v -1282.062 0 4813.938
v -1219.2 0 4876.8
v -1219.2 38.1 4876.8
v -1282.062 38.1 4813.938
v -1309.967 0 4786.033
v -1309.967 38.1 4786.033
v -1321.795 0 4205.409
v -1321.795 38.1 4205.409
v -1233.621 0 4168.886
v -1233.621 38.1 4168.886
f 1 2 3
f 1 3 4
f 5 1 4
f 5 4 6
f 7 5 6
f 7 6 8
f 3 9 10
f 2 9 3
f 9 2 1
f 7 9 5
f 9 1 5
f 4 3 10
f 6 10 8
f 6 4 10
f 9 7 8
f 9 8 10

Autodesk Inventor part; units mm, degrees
ref_plane "YZ Plane" through (0, 0, 0) normal (1, 0, 0) x (0, 1, 0)
ref_plane "XZ Plane" through (0, 0, 0) normal (0, 1, 0) x (-1, 0, 0)
ref_plane "XY Plane" through (0, 0, 0) normal (0, 0, 1) x (1, 0, 0)
sketch "Sketch1" plane through (0, 0, 0) normal (0, 1, 0) x (-1, 0, 0)
  line L0 (0, 0) -> (0, -1219.2)
  line L1 (0, 0) -> (88.9, 0)
  line L2 (88.9, 0) -> (88.9, -1219.2)
  line L3 (88.9, -1219.2) -> (0, -1219.2)
  line L4 (0, 0) -> (0, 1219.2) construction
  line L5 (0, 1219.2) -> (1219.2, 1219.2) construction
  line L6 (0, 1219.2) -> (0, 3657.6) construction
  line L7 (0, 3657.6) -> (0, 4876.8) construction
  line L8 (0, 4876.8) -> (0, 6096) construction
  line L9 (0, -1219.2) -> (2438.4, -1219.2) construction
  line L10 (0, 6096) -> (2438.4, 6096) construction
  line L11 (2438.4, 6096) -> (2438.4, -1219.2) construction
  line L12 (0, 3657.6) -> (0, 3352.8) construction
  line L13 (0, 3352.8) -> (2438.4, 3352.8) construction
  line L14 (2438.4, 3352.8) -> (1219.2, 3352.8)
  line L15 (1219.2, 3352.8) -> (1219.2, 3263.9)
  line L16 (1219.2, 3263.9) -> (2438.4, 3263.9)
  line L17 (2438.4, 3263.9) -> (2438.4, 3352.8)
  line L18 (0, 6096) -> (862.1046, 6958.1046)
  line L19 (862.1046, 6958.1046) -> (924.9664, 6895.2428)
  line L20 (924.9664, 6895.2428) -> (62.8618, 6033.1382)
  line L21 (62.8618, 6033.1382) -> (0, 6096)
  line L22 (0, 4876.8) -> (1219.2, 4876.8) construction
  line L23 (1219.2, 4876.8) -> (2081.3046, 5738.9046)
  line L24 (1219.2, 1219.2) -> (2081.3046, 357.0954)
  line L25 (2081.3046, 357.0954) -> (2018.4428, 294.2336)
  line L26 (2018.4428, 294.2336) -> (1156.3382, 1156.3382)
  line L27 (1156.3382, 1156.3382) -> (1219.2, 1219.2)
  line L28 (2018.4428, 294.2336) -> (88.9, -1219.2)
  line L29 (2081.3046, 357.0954) -> (2144.1664, 419.9572)
  line L30 (2144.1664, 419.9572) -> (1282.0618, 1282.0618)
  line L31 (1282.0618, 1282.0618) -> (1219.2, 1219.2)
  line L32 (2438.4, 3352.8) -> (2438.4, 3441.7)
  line L33 (2438.4, 3441.7) -> (1219.2, 3441.7)
  line L34 (1219.2, 3441.7) -> (1219.2, 3352.8)
  line L35 (1156.3382, 4939.6618) -> (1282.0618, 4813.9382)
  line L36 (2018.4428, 5801.7664) -> (2144.1664, 5676.0428)
  line L37 (1282.0618, 4813.9382) -> (2144.1664, 5676.0428)
  line L38 (2018.4428, 5801.7664) -> (1156.3382, 4939.6618)
  line L39 (2018.4428, 5801.7664) -> (924.9664, 6895.2428)
  line L40 (62.8618, 6033.1382) -> (1156.3382, 4939.6618)
  line L41 (1233.6206, 4168.8855) -> (1267.6412, 4086.7527)
  line L42 (1263.7078, 2313.9849) -> (1230.0006, 2231.7229)
  arc A0 (862.1046, 6958.1046) -> (0, 6096) centre (431.0523, 6527.0523) ccw
  line L43 (1246.8542, 2272.8539) -> (2375.0183, 1810.583)
  line L44 (2391.8719, 1851.7139) -> (2358.1646, 1769.452)
  line L45 (2391.8719, 1851.7139) -> (1263.7078, 2313.9849)
  line L46 (1230.0006, 2231.7229) -> (2358.1646, 1769.452)
  line L47 (1230.0006, 2231.7229) -> (1219.2, 3263.9)
  line L48 (2144.1664, 419.9572) -> (2391.8719, 1851.7139)
  line L49 (2391.8719, 1851.7139) -> (2438.4, 3263.9)
  line L50 (1219.2, 3441.7) -> (1233.6206, 4168.8855)
  line L51 (1250.6309, 4127.8191) -> (2377.0248, 4594.3867)
  line L52 (2360.0145, 4635.4532) -> (2394.0351, 4553.3203)
  line L53 (2394.0351, 4553.3203) -> (1267.6412, 4086.7527)
  line L54 (2360.0145, 4635.4532) -> (1233.6206, 4168.8855)
  line L55 (2394.0351, 4553.3203) -> (2144.1664, 5676.0428)
  line L56 (2438.4, 3441.7) -> (2394.0351, 4553.3203)
  line L57 (2144.1664, 5676.0428) -> (2057.3895, 5656.7301)
  line L58 (2394.0351, 4553.3203) -> (2305.2058, 4549.7751)
  line L59 (2394.0351, 4553.3203) -> (2307.2582, 4534.0076)
  line L60 (2307.2582, 4534.0076) -> (2057.3895, 5656.7301)
  line L61 (2438.4, 3441.7) -> (2349.5707, 3438.1548)
  line L62 (2349.5707, 3438.1548) -> (2305.2058, 4549.7751)
  line L63 (1219.2, 3441.7) -> (1308.0825, 3439.9374)
  line L64 (1233.6206, 4168.8855) -> (1322.5031, 4167.1229)
  line L65 (1322.5031, 4167.1229) -> (1308.0825, 3439.9374)
  line L66 (2018.4428, 5801.7664) -> (1955.581, 5738.9046)
  line L67 (1955.581, 5738.9046) -> (862.1046, 6832.381)
  line L68 (924.9664, 6895.2428) -> (862.1046, 6832.381)
  line L69 (62.8618, 6033.1382) -> (125.7236, 6096)
  line L70 (62.8618, 6033.1382) -> (125.7236, 6096)
  line L71 (125.7236, 6096) -> (1219.2, 5002.5236)
  line L72 (1156.3382, 1156.3382) -> (0, 0)
  line L73 (0, 0) -> (62.8618, -62.8618)
  line L74 (1156.3382, 1156.3382) -> (1219.2, 1093.4764)
  line L75 (1219.2, 1093.4764) -> (62.8618, -62.8618)
  line L76 (2018.4428, 294.2336) -> (1963.5776, 364.1837)
  line L77 (88.9, -1219.2) -> (34.0348, -1149.2499)
  line L78 (34.0348, -1149.2499) -> (1963.5776, 364.1837)
  line L79 (2144.1664, 419.9572) -> (2056.5677, 435.1125)
  line L80 (2391.8719, 1851.7139) -> (2304.2732, 1866.8692)
  line L81 (2391.8719, 1851.7139) -> (2303.0201, 1854.6414)
  line L82 (2304.2732, 1866.8692) -> (2056.5677, 435.1125)
  line L83 (1230.0006, 2231.7229) -> (1318.8957, 2232.6531)
  line L84 (1219.2, 3263.9) -> (1308.0951, 3264.8302)
  line L85 (1308.0951, 3264.8302) -> (1318.8957, 2232.6531)
  line L86 (2438.4, 3263.9) -> (2349.5482, 3266.8275)
  line L87 (2349.5482, 3266.8275) -> (2303.0201, 1854.6414)
  line L88 (88.9, 0) -> (125.7236, 0)
  line L89 (1233.6206, 4168.8855) -> (1219.2, 4876.8)
  line L90 (1233.6206, 4168.8855) -> (1322.5022, 4170.6961)
  line L91 (1219.2, 4876.8) -> (1308.0816, 4878.6106)
  line L92 (1308.0816, 4878.6106) -> (1322.5022, 4170.6961)
  line L93 (1282.0618, 4813.9382) -> (1309.9674, 4786.0326)
  line L94 (1267.6412, 4086.7527) -> (1318.4756, 3964.0275)
  line L95 (2360.0145, 4635.4532) -> (2374.4273, 4641.4231)
  line L96 (1230.0006, 2231.7229) -> (1219.2, 1219.2)
  line L97 (1230.0006, 2231.7229) -> (1318.8955, 2230.7747)
  line L98 (1219.2, 1219.2) -> (1308.0949, 1218.2518)
  line L99 (1308.0949, 1218.2518) -> (1318.8955, 2230.7747)
  line L100 (1282.0618, 1282.0618) -> (1309.0636, 1309.0636)
  line L101 (1263.7078, 2313.9849) -> (1316.7428, 2438.4)
  line L102 (2358.1646, 1769.452) -> (2376.5379, 1763.082)
  point P0 (1770.957, 2057.4547)
  point P1 (1955.1236, 357.5528)
  point P2 (88.9, -1106.2164)
  point P3 (2292.1025, 1796.5213)
  point P4 (2067.2525, 496.8711)
  point P5 (1318.5187, 2195.4522)
  point P6 (1308.1049, 3263.9)
  point P7 (2349.4518, 3263.9)
  point P8 (2304.1085, 1887.6754)
  point P9 (2306.5112, 4517.0667)
  point P10 (2349.4292, 3441.7)
  point P11 (1308.1175, 3441.7)
  point P12 (2069.6708, 5601.5472)
  point P13 (2291.0394, 4606.8827)
  point P14 (1321.7951, 4205.4086)
  dimension "d0" = 1219.2
  dimension "d2" = 1219.2
  dimension "d3" = 1219.2
  dimension "d16" = 2438.4
  dimension "d17" = 1219.2
  dimension "d18" = 1219.2
  dimension "d20" = 2438.4
  dimension "d21" = 304.8
  dimension "d22" = 1219.2
  dimension "d23" = 88.9
  dimension "d24" = 1219.2
  dimension "d25" = 45
  dimension "d26" = 88.9
  dimension "d27" = 1219.2
  dimension "d28" = 1219.2
  dimension "d29" = 1219.2
  dimension "d31" = 1219.2
  dimension "d32" = 88.9
  dimension "d33" = 88.9
  dimension "d34" = 88.9
  dimension "d35" = 177.8
  dimension "d36" = 177.8
  dimension "d38" = 88.9
  dimension "d39" = 88.9
  dimension "d43" = 1219.2
  dimension "d44" = 88.9
  dimension "d45" = 1219.2
  dimension "d46" = 88.9
  dimension "d47" = 88.9
  dimension "d48" = 88.9
  dimension "d49" = 88.9
  dimension "d50" = 88.9
  dimension "d51" = 88.9
  dimension "d54" = 88.9
  dimension "d55" = 88.9
  dimension "d57" = 88.9
  dimension "d58" = 88.9
  dimension "d59" = 88.9
  dimension "d60" = 88.9
  dimension "d61" = 88.9
  dimension "d64" = 88.9
  dimension "d65" = 88.9
  dimension "d66" = 88.9
  dimension "d69" = 88.9
  dimension "d70" = 88.9
  dimension "d71" = 88.9
  dimension "d72" = 88.9
extrude "Extrusion1" add sketch "Sketch1" along normal blind 38.1 contours L89 L35 L93 L92 L54
properties part number "S_2x4x27.876"
